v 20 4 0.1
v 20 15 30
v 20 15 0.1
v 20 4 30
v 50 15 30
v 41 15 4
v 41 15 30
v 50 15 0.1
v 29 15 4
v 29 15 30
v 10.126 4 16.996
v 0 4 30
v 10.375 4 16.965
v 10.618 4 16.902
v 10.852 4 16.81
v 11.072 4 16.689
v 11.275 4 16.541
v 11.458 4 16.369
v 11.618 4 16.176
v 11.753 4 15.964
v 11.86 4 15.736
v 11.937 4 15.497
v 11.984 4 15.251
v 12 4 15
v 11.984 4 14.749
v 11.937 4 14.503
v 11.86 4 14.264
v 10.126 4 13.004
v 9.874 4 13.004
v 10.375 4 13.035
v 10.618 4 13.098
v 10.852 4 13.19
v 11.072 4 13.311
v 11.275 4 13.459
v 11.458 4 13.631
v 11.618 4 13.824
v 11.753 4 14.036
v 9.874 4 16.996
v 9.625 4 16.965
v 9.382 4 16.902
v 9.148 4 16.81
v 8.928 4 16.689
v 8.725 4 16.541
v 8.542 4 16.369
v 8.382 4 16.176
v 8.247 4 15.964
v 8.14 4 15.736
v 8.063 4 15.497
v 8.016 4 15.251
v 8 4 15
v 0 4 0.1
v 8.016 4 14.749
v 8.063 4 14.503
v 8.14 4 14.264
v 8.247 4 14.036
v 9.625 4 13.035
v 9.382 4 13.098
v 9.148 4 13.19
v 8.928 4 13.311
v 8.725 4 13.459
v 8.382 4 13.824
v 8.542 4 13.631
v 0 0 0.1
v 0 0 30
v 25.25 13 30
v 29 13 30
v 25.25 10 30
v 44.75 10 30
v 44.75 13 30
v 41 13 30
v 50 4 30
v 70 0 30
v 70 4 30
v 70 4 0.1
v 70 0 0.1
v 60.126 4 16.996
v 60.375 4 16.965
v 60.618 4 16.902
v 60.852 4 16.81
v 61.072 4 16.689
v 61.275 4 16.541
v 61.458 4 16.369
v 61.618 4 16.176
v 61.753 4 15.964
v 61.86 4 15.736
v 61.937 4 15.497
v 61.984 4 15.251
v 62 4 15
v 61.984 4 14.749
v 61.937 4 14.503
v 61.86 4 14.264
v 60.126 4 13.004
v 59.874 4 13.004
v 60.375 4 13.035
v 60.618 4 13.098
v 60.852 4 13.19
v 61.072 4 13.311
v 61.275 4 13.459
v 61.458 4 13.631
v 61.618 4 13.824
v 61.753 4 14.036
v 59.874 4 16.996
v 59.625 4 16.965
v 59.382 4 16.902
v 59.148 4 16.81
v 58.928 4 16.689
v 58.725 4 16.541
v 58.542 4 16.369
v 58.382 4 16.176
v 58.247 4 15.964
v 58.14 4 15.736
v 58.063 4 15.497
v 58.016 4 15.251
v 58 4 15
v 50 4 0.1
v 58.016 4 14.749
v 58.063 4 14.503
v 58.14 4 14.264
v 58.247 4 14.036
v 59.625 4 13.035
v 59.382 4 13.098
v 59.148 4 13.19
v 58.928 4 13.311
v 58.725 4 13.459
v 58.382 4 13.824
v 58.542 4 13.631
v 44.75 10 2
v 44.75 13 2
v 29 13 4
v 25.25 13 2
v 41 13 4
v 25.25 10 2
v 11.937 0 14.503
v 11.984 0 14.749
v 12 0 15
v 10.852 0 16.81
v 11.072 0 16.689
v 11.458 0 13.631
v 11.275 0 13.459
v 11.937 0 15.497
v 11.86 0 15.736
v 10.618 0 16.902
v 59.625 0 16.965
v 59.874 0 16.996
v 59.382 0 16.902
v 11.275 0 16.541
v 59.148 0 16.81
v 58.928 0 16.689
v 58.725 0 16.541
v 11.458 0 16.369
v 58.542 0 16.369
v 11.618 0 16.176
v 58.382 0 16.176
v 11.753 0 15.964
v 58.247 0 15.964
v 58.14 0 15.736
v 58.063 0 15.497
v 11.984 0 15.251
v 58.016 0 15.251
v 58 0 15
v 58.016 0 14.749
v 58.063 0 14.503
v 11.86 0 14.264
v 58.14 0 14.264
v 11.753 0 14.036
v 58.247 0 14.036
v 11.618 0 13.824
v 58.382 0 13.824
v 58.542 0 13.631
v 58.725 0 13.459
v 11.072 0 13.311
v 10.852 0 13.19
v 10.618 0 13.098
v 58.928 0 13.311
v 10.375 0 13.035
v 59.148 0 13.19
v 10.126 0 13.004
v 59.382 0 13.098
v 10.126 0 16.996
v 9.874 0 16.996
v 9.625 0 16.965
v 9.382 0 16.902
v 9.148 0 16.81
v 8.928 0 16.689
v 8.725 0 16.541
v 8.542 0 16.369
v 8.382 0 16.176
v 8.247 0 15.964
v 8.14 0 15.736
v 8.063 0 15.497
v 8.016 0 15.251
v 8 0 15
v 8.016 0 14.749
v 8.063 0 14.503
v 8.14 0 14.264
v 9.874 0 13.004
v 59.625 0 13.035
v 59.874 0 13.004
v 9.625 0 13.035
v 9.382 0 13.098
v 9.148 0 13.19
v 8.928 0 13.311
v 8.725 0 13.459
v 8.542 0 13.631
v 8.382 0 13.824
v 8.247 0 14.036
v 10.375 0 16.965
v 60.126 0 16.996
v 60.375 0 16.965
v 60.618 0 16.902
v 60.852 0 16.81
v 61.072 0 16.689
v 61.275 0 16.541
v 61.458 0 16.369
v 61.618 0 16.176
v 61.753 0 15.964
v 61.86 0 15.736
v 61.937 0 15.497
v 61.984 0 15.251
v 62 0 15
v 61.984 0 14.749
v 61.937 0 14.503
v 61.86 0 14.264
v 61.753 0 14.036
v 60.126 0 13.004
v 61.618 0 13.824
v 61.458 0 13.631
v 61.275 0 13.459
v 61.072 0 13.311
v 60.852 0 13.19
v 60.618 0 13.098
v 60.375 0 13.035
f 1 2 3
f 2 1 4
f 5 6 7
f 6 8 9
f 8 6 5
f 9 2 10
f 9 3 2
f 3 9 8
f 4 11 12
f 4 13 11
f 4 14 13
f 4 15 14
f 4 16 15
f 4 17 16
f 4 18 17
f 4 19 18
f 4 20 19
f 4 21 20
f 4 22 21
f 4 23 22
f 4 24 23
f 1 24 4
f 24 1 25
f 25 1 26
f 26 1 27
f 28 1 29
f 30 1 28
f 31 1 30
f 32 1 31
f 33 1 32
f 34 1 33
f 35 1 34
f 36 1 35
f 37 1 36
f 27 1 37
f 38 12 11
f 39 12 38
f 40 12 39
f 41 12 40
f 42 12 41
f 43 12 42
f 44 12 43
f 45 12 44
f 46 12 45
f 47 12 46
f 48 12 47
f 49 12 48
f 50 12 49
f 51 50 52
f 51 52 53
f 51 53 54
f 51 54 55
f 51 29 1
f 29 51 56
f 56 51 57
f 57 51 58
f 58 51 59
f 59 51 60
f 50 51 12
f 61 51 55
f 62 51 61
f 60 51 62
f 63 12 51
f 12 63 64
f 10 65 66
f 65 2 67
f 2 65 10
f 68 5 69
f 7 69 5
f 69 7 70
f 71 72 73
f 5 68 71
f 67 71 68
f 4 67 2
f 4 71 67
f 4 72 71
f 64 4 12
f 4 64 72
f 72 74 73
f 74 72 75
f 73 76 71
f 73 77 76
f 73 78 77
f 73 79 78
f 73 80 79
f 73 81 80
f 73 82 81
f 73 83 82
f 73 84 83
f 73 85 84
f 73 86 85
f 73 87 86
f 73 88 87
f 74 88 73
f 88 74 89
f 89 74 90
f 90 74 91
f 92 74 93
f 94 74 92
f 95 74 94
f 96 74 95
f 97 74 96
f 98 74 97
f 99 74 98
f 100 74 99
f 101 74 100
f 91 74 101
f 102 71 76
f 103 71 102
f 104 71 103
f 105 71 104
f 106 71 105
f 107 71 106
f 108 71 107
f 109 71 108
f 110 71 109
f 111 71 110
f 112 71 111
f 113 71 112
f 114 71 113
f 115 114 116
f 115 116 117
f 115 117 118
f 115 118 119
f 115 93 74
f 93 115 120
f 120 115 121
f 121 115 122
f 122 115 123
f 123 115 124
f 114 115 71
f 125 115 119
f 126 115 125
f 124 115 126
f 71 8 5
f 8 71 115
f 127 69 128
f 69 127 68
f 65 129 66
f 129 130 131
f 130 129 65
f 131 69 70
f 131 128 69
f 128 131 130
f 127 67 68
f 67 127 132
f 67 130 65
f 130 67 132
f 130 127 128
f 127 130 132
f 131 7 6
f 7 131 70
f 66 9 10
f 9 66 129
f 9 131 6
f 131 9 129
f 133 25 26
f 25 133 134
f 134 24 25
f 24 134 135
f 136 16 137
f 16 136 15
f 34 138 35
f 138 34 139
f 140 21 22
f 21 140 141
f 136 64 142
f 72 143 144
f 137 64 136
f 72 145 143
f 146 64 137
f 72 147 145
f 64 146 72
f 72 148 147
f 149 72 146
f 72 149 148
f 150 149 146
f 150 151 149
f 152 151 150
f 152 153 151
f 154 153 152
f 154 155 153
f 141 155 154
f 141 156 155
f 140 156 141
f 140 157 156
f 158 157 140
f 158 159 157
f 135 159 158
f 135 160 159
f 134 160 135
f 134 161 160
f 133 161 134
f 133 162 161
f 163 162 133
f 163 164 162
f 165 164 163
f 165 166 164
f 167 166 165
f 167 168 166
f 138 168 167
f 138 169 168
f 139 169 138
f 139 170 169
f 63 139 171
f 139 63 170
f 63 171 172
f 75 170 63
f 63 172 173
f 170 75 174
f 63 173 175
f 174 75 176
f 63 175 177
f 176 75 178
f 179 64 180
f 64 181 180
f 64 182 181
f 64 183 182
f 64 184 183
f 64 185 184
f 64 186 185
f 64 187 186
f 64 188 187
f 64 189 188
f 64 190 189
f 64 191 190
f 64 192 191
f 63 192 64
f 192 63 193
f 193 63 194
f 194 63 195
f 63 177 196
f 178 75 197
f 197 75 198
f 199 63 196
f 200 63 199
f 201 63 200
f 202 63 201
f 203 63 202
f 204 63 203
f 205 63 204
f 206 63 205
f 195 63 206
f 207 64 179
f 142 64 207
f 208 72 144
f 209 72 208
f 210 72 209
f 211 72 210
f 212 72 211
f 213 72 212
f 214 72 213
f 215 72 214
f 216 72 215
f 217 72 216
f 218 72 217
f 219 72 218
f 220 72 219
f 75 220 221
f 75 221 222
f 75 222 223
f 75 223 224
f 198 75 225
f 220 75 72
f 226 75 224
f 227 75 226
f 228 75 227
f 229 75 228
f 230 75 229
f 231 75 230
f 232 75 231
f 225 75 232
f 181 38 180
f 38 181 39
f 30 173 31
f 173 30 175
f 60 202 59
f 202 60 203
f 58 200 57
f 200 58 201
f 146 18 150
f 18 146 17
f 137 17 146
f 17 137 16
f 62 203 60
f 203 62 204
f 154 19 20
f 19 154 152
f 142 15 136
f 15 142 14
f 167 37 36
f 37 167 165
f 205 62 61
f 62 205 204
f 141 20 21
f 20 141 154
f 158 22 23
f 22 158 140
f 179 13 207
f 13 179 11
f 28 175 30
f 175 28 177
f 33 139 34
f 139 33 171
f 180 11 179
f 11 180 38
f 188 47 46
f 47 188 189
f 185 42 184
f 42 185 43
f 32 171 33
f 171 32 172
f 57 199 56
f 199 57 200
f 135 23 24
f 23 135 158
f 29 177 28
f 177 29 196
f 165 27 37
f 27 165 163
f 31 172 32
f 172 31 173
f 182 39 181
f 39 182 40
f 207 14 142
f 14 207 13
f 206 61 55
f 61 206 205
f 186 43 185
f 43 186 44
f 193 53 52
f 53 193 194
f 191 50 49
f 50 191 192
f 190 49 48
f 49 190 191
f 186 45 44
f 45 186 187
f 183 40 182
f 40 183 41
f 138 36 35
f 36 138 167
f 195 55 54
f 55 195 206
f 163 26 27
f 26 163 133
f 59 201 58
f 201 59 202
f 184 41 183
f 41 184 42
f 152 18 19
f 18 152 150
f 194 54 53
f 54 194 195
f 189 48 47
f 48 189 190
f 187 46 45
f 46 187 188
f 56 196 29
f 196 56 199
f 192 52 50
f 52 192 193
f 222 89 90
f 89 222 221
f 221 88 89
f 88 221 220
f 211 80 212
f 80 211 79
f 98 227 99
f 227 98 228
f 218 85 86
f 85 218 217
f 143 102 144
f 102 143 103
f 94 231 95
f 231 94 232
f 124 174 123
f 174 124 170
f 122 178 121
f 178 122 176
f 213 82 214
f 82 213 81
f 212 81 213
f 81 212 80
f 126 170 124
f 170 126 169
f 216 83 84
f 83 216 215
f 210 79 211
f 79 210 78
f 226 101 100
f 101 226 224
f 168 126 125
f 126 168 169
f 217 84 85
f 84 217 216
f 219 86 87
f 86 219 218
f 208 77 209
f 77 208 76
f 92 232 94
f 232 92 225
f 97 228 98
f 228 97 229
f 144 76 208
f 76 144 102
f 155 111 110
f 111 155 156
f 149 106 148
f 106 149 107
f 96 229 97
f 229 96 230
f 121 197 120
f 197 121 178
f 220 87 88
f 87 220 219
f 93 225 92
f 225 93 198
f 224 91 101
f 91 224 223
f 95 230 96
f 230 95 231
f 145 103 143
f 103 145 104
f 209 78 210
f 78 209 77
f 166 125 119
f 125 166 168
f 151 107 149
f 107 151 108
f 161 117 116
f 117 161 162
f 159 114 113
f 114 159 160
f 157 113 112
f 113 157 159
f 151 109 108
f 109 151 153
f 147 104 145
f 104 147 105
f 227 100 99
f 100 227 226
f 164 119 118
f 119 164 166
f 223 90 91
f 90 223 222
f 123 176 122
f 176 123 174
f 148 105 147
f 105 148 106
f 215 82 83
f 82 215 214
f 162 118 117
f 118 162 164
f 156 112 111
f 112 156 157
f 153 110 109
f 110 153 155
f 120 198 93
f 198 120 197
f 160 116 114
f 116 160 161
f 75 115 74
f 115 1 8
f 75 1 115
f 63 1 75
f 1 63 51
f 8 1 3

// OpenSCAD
xwidth_slider=70; // [40:80]
xdepth_slider=30; // [22:40]
xheight_slider=15; // [10:60
plategap=19.5;

xwidth=xwidth_slider;
xdepth=xdepth_slider;
xheight=xheight_slider;

translate([0,0,xdepth]){
rotate([270,0,0]){
difference(){
// main body    
cube([xwidth,xdepth-0.1,xheight]){};
union(){
    // left
    translate([0,0,4]){
        cube([(xwidth-30)/2,xdepth,xheight-4]){};
    }
    // right
    translate([xwidth-((xwidth-30)/2),0,4]){
        cube([(xwidth-30)/2,xdepth,xheight-4]){};
    }
    // center bottom gap
    translate([(xwidth/2)-(plategap/2),0,xheight-5]){
        cube([plategap,xdepth-2,3]){};
    }
    // center top gap
    translate([(xwidth/2)-6,0,xheight-3]){
        cube([12,xdepth-4,10]){};
    }
    // left bolt hole
    translate([((xwidth-30)/2)/2,xdepth/2,0]){
        cylinder(h=xheight, r=2, $fn=50);
    }
    //right bolt hole
    translate([xwidth-(((xwidth-30)/2)/2),xdepth/2,0]){
        cylinder(h=xheight, r=2, $fn=50);
    }
};
};
};
};
